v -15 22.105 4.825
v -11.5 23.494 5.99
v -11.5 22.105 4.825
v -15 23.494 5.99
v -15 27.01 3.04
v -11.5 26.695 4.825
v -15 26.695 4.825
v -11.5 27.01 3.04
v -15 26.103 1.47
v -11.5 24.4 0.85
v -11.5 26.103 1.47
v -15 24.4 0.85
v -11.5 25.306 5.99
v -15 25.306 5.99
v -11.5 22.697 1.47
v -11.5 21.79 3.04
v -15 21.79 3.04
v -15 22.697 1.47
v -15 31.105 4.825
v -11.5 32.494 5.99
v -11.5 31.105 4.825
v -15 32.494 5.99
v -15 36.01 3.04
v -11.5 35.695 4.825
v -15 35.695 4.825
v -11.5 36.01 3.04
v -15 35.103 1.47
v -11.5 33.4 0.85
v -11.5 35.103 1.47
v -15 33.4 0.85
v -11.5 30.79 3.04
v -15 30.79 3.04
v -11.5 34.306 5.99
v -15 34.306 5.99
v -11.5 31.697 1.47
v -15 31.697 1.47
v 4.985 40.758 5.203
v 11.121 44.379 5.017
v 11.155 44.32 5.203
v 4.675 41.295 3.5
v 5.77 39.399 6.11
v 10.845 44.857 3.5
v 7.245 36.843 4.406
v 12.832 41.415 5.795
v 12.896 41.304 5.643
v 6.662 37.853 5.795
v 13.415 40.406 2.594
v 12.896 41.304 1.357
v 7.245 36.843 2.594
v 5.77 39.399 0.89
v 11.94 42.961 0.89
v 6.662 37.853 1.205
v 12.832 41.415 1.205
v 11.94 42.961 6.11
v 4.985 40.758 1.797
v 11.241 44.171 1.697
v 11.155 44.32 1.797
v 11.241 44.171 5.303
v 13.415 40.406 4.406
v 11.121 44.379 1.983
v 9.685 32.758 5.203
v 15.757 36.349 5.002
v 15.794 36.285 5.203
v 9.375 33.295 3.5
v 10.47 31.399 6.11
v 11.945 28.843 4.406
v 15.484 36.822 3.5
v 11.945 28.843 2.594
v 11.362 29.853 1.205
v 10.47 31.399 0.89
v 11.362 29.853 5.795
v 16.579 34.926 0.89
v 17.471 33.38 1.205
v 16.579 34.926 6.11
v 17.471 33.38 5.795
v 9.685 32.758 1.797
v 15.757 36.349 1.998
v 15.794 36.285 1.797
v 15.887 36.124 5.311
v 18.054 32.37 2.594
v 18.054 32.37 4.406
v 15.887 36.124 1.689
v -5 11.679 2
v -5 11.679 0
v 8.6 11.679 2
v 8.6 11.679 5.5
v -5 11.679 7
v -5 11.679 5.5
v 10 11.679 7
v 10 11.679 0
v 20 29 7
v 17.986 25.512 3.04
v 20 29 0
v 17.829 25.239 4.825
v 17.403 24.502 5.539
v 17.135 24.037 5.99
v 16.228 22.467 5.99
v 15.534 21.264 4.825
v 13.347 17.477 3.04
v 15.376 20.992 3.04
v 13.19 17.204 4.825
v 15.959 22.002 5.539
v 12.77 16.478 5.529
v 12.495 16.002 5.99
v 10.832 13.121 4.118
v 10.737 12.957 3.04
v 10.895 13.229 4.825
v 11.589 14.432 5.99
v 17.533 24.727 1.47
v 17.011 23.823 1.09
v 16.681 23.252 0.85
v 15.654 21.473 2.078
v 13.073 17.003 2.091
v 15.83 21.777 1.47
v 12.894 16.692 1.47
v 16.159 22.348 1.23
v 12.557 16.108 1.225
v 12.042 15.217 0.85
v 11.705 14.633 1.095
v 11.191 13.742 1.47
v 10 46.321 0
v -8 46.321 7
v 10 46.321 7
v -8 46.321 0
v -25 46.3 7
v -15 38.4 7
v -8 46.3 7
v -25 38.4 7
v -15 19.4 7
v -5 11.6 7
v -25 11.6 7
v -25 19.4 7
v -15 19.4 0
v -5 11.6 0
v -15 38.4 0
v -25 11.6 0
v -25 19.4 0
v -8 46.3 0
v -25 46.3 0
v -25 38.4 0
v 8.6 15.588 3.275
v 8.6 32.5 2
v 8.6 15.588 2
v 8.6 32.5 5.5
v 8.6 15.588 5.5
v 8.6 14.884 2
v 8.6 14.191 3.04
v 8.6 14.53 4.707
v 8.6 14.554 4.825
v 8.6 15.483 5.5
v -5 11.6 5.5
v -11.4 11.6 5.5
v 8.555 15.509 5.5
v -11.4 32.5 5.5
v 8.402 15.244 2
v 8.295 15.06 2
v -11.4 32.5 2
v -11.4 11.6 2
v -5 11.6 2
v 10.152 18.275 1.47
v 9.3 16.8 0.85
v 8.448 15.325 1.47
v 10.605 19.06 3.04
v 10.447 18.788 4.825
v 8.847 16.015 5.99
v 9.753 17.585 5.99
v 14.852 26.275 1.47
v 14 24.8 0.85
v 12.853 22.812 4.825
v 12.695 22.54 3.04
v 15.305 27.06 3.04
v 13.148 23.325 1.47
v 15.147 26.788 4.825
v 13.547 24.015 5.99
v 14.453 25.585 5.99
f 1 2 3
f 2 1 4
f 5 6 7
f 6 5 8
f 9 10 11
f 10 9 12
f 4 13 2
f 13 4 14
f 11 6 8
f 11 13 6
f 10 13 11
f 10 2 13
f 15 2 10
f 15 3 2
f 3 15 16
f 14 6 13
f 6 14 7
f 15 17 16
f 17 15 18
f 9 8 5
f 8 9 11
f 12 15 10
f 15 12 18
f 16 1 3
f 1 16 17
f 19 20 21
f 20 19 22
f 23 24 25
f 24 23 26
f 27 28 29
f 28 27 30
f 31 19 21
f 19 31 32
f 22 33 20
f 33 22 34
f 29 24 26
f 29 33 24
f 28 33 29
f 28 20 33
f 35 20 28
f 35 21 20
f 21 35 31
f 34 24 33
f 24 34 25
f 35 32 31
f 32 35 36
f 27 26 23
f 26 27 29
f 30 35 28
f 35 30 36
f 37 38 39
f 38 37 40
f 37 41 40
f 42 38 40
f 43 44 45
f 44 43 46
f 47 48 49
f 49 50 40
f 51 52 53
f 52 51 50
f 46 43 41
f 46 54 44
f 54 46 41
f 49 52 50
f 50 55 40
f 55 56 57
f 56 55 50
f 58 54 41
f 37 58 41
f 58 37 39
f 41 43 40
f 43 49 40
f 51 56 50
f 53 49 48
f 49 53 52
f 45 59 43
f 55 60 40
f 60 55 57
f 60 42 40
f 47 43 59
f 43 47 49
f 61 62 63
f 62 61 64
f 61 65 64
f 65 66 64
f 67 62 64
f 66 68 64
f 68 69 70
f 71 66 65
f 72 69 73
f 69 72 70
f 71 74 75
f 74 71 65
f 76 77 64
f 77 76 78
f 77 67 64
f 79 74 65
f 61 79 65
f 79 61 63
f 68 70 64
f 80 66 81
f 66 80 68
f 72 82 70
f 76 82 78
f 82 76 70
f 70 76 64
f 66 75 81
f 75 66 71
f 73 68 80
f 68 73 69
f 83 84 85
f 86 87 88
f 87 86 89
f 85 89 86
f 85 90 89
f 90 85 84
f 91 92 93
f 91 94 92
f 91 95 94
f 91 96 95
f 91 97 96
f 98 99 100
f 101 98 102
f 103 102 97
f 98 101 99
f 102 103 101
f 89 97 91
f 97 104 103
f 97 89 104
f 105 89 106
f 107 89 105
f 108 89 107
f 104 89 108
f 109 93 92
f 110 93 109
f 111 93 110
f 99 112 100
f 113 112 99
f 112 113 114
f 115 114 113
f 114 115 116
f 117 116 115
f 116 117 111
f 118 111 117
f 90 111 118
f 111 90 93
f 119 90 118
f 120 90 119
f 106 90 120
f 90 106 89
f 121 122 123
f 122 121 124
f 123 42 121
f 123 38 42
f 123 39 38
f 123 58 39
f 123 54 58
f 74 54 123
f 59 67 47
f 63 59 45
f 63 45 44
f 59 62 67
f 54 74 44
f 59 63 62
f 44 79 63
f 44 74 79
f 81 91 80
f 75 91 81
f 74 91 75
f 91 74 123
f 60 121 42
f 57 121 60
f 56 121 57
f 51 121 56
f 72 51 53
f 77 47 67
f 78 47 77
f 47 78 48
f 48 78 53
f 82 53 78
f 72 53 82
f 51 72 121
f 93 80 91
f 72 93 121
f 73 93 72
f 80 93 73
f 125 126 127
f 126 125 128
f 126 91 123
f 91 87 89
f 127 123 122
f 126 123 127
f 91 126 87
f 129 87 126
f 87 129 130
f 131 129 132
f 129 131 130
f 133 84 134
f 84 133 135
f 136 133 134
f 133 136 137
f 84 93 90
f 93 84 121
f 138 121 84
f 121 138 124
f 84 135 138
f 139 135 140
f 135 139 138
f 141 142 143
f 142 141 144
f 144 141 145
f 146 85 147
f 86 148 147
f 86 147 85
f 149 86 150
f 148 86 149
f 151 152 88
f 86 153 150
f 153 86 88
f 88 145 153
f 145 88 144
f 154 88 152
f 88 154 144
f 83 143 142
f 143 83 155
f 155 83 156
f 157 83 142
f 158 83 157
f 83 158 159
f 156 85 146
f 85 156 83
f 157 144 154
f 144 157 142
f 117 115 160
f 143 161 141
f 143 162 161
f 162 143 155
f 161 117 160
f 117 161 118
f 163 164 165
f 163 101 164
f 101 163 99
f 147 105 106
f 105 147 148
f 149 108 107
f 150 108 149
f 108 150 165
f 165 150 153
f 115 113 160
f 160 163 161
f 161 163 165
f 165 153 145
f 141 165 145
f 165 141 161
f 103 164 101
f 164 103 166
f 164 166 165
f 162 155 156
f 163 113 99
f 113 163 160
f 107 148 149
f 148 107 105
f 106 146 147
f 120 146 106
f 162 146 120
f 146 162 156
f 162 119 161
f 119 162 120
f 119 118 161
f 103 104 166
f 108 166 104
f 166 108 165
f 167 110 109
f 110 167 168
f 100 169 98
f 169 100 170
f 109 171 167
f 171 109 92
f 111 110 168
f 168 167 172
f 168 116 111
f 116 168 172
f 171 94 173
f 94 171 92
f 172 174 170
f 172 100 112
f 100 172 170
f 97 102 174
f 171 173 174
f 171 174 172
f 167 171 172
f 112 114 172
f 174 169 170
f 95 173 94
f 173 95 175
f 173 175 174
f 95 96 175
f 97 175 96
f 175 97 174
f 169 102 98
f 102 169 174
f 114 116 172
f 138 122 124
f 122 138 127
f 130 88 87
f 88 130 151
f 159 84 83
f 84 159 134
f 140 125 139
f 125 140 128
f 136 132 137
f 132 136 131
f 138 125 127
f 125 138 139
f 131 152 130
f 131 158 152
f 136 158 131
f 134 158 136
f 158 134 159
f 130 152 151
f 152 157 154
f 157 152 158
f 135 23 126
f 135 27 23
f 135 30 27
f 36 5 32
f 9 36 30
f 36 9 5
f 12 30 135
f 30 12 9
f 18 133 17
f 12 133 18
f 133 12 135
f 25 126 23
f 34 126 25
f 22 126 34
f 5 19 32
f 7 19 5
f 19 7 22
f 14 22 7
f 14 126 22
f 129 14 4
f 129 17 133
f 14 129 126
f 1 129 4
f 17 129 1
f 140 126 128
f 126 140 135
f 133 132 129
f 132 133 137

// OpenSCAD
z=7; //высота
g=3.5; //глубина дырок 
//дексибироза
translate ([0,79,0]) {
difference () {
translate([0,-50,0])cylinder(z,20,20, $fn=6);
translate ([-11.4,-67.5,2])cube ([20,21,3.5]);
translate ([-7,0,0]) {
rotate([0, 90, 0]) translate([-3.5,-54.6,-17+g]) cylinder(9,2.65,2.65);        
rotate([0, 90, 0]) translate([-3.5,-45.6,-17+g]) cylinder(9,2.65,2.65);          
}  
translate ([9.3,-62.2,3.5])rotate([0,90,-30])cylinder (4.5+g,2.65,2.65);
translate ([14,-54.2,3.5])rotate([0,90,-30])cylinder (4.5+g,2.65,2.65);
translate ([-28,-73,-1])cube ([20,45,9]);

translate ([2,-80,0]) {
translate ([4,40,g])rotate ([90,0,120])cylinder(4.5+g,2.65,2.65);   
translate ([4+4.7,37.5+-9+g,g])rotate ([90,0,120])cylinder(4.5+3.5,2.65,2.65); 
  }  
 }
difference () {
translate ([-25,-67.4,0])cube ([20,34.7,7]);
translate ([-11.4,-67.5,2])cube ([20,21,3.5]);
translate ([-7,0,0]) {
rotate([0, 90, 0]) translate([-3.5,-54.6,-17+g]) cylinder(9,2.65,2.65);        
rotate([0, 90, 0]) translate([-3.5,-45.6,-17+g]) cylinder(9,2.65,2.65);          
}  

translate ([-35,-59.6,-1])cube ([20,19,12]);
 }
}
